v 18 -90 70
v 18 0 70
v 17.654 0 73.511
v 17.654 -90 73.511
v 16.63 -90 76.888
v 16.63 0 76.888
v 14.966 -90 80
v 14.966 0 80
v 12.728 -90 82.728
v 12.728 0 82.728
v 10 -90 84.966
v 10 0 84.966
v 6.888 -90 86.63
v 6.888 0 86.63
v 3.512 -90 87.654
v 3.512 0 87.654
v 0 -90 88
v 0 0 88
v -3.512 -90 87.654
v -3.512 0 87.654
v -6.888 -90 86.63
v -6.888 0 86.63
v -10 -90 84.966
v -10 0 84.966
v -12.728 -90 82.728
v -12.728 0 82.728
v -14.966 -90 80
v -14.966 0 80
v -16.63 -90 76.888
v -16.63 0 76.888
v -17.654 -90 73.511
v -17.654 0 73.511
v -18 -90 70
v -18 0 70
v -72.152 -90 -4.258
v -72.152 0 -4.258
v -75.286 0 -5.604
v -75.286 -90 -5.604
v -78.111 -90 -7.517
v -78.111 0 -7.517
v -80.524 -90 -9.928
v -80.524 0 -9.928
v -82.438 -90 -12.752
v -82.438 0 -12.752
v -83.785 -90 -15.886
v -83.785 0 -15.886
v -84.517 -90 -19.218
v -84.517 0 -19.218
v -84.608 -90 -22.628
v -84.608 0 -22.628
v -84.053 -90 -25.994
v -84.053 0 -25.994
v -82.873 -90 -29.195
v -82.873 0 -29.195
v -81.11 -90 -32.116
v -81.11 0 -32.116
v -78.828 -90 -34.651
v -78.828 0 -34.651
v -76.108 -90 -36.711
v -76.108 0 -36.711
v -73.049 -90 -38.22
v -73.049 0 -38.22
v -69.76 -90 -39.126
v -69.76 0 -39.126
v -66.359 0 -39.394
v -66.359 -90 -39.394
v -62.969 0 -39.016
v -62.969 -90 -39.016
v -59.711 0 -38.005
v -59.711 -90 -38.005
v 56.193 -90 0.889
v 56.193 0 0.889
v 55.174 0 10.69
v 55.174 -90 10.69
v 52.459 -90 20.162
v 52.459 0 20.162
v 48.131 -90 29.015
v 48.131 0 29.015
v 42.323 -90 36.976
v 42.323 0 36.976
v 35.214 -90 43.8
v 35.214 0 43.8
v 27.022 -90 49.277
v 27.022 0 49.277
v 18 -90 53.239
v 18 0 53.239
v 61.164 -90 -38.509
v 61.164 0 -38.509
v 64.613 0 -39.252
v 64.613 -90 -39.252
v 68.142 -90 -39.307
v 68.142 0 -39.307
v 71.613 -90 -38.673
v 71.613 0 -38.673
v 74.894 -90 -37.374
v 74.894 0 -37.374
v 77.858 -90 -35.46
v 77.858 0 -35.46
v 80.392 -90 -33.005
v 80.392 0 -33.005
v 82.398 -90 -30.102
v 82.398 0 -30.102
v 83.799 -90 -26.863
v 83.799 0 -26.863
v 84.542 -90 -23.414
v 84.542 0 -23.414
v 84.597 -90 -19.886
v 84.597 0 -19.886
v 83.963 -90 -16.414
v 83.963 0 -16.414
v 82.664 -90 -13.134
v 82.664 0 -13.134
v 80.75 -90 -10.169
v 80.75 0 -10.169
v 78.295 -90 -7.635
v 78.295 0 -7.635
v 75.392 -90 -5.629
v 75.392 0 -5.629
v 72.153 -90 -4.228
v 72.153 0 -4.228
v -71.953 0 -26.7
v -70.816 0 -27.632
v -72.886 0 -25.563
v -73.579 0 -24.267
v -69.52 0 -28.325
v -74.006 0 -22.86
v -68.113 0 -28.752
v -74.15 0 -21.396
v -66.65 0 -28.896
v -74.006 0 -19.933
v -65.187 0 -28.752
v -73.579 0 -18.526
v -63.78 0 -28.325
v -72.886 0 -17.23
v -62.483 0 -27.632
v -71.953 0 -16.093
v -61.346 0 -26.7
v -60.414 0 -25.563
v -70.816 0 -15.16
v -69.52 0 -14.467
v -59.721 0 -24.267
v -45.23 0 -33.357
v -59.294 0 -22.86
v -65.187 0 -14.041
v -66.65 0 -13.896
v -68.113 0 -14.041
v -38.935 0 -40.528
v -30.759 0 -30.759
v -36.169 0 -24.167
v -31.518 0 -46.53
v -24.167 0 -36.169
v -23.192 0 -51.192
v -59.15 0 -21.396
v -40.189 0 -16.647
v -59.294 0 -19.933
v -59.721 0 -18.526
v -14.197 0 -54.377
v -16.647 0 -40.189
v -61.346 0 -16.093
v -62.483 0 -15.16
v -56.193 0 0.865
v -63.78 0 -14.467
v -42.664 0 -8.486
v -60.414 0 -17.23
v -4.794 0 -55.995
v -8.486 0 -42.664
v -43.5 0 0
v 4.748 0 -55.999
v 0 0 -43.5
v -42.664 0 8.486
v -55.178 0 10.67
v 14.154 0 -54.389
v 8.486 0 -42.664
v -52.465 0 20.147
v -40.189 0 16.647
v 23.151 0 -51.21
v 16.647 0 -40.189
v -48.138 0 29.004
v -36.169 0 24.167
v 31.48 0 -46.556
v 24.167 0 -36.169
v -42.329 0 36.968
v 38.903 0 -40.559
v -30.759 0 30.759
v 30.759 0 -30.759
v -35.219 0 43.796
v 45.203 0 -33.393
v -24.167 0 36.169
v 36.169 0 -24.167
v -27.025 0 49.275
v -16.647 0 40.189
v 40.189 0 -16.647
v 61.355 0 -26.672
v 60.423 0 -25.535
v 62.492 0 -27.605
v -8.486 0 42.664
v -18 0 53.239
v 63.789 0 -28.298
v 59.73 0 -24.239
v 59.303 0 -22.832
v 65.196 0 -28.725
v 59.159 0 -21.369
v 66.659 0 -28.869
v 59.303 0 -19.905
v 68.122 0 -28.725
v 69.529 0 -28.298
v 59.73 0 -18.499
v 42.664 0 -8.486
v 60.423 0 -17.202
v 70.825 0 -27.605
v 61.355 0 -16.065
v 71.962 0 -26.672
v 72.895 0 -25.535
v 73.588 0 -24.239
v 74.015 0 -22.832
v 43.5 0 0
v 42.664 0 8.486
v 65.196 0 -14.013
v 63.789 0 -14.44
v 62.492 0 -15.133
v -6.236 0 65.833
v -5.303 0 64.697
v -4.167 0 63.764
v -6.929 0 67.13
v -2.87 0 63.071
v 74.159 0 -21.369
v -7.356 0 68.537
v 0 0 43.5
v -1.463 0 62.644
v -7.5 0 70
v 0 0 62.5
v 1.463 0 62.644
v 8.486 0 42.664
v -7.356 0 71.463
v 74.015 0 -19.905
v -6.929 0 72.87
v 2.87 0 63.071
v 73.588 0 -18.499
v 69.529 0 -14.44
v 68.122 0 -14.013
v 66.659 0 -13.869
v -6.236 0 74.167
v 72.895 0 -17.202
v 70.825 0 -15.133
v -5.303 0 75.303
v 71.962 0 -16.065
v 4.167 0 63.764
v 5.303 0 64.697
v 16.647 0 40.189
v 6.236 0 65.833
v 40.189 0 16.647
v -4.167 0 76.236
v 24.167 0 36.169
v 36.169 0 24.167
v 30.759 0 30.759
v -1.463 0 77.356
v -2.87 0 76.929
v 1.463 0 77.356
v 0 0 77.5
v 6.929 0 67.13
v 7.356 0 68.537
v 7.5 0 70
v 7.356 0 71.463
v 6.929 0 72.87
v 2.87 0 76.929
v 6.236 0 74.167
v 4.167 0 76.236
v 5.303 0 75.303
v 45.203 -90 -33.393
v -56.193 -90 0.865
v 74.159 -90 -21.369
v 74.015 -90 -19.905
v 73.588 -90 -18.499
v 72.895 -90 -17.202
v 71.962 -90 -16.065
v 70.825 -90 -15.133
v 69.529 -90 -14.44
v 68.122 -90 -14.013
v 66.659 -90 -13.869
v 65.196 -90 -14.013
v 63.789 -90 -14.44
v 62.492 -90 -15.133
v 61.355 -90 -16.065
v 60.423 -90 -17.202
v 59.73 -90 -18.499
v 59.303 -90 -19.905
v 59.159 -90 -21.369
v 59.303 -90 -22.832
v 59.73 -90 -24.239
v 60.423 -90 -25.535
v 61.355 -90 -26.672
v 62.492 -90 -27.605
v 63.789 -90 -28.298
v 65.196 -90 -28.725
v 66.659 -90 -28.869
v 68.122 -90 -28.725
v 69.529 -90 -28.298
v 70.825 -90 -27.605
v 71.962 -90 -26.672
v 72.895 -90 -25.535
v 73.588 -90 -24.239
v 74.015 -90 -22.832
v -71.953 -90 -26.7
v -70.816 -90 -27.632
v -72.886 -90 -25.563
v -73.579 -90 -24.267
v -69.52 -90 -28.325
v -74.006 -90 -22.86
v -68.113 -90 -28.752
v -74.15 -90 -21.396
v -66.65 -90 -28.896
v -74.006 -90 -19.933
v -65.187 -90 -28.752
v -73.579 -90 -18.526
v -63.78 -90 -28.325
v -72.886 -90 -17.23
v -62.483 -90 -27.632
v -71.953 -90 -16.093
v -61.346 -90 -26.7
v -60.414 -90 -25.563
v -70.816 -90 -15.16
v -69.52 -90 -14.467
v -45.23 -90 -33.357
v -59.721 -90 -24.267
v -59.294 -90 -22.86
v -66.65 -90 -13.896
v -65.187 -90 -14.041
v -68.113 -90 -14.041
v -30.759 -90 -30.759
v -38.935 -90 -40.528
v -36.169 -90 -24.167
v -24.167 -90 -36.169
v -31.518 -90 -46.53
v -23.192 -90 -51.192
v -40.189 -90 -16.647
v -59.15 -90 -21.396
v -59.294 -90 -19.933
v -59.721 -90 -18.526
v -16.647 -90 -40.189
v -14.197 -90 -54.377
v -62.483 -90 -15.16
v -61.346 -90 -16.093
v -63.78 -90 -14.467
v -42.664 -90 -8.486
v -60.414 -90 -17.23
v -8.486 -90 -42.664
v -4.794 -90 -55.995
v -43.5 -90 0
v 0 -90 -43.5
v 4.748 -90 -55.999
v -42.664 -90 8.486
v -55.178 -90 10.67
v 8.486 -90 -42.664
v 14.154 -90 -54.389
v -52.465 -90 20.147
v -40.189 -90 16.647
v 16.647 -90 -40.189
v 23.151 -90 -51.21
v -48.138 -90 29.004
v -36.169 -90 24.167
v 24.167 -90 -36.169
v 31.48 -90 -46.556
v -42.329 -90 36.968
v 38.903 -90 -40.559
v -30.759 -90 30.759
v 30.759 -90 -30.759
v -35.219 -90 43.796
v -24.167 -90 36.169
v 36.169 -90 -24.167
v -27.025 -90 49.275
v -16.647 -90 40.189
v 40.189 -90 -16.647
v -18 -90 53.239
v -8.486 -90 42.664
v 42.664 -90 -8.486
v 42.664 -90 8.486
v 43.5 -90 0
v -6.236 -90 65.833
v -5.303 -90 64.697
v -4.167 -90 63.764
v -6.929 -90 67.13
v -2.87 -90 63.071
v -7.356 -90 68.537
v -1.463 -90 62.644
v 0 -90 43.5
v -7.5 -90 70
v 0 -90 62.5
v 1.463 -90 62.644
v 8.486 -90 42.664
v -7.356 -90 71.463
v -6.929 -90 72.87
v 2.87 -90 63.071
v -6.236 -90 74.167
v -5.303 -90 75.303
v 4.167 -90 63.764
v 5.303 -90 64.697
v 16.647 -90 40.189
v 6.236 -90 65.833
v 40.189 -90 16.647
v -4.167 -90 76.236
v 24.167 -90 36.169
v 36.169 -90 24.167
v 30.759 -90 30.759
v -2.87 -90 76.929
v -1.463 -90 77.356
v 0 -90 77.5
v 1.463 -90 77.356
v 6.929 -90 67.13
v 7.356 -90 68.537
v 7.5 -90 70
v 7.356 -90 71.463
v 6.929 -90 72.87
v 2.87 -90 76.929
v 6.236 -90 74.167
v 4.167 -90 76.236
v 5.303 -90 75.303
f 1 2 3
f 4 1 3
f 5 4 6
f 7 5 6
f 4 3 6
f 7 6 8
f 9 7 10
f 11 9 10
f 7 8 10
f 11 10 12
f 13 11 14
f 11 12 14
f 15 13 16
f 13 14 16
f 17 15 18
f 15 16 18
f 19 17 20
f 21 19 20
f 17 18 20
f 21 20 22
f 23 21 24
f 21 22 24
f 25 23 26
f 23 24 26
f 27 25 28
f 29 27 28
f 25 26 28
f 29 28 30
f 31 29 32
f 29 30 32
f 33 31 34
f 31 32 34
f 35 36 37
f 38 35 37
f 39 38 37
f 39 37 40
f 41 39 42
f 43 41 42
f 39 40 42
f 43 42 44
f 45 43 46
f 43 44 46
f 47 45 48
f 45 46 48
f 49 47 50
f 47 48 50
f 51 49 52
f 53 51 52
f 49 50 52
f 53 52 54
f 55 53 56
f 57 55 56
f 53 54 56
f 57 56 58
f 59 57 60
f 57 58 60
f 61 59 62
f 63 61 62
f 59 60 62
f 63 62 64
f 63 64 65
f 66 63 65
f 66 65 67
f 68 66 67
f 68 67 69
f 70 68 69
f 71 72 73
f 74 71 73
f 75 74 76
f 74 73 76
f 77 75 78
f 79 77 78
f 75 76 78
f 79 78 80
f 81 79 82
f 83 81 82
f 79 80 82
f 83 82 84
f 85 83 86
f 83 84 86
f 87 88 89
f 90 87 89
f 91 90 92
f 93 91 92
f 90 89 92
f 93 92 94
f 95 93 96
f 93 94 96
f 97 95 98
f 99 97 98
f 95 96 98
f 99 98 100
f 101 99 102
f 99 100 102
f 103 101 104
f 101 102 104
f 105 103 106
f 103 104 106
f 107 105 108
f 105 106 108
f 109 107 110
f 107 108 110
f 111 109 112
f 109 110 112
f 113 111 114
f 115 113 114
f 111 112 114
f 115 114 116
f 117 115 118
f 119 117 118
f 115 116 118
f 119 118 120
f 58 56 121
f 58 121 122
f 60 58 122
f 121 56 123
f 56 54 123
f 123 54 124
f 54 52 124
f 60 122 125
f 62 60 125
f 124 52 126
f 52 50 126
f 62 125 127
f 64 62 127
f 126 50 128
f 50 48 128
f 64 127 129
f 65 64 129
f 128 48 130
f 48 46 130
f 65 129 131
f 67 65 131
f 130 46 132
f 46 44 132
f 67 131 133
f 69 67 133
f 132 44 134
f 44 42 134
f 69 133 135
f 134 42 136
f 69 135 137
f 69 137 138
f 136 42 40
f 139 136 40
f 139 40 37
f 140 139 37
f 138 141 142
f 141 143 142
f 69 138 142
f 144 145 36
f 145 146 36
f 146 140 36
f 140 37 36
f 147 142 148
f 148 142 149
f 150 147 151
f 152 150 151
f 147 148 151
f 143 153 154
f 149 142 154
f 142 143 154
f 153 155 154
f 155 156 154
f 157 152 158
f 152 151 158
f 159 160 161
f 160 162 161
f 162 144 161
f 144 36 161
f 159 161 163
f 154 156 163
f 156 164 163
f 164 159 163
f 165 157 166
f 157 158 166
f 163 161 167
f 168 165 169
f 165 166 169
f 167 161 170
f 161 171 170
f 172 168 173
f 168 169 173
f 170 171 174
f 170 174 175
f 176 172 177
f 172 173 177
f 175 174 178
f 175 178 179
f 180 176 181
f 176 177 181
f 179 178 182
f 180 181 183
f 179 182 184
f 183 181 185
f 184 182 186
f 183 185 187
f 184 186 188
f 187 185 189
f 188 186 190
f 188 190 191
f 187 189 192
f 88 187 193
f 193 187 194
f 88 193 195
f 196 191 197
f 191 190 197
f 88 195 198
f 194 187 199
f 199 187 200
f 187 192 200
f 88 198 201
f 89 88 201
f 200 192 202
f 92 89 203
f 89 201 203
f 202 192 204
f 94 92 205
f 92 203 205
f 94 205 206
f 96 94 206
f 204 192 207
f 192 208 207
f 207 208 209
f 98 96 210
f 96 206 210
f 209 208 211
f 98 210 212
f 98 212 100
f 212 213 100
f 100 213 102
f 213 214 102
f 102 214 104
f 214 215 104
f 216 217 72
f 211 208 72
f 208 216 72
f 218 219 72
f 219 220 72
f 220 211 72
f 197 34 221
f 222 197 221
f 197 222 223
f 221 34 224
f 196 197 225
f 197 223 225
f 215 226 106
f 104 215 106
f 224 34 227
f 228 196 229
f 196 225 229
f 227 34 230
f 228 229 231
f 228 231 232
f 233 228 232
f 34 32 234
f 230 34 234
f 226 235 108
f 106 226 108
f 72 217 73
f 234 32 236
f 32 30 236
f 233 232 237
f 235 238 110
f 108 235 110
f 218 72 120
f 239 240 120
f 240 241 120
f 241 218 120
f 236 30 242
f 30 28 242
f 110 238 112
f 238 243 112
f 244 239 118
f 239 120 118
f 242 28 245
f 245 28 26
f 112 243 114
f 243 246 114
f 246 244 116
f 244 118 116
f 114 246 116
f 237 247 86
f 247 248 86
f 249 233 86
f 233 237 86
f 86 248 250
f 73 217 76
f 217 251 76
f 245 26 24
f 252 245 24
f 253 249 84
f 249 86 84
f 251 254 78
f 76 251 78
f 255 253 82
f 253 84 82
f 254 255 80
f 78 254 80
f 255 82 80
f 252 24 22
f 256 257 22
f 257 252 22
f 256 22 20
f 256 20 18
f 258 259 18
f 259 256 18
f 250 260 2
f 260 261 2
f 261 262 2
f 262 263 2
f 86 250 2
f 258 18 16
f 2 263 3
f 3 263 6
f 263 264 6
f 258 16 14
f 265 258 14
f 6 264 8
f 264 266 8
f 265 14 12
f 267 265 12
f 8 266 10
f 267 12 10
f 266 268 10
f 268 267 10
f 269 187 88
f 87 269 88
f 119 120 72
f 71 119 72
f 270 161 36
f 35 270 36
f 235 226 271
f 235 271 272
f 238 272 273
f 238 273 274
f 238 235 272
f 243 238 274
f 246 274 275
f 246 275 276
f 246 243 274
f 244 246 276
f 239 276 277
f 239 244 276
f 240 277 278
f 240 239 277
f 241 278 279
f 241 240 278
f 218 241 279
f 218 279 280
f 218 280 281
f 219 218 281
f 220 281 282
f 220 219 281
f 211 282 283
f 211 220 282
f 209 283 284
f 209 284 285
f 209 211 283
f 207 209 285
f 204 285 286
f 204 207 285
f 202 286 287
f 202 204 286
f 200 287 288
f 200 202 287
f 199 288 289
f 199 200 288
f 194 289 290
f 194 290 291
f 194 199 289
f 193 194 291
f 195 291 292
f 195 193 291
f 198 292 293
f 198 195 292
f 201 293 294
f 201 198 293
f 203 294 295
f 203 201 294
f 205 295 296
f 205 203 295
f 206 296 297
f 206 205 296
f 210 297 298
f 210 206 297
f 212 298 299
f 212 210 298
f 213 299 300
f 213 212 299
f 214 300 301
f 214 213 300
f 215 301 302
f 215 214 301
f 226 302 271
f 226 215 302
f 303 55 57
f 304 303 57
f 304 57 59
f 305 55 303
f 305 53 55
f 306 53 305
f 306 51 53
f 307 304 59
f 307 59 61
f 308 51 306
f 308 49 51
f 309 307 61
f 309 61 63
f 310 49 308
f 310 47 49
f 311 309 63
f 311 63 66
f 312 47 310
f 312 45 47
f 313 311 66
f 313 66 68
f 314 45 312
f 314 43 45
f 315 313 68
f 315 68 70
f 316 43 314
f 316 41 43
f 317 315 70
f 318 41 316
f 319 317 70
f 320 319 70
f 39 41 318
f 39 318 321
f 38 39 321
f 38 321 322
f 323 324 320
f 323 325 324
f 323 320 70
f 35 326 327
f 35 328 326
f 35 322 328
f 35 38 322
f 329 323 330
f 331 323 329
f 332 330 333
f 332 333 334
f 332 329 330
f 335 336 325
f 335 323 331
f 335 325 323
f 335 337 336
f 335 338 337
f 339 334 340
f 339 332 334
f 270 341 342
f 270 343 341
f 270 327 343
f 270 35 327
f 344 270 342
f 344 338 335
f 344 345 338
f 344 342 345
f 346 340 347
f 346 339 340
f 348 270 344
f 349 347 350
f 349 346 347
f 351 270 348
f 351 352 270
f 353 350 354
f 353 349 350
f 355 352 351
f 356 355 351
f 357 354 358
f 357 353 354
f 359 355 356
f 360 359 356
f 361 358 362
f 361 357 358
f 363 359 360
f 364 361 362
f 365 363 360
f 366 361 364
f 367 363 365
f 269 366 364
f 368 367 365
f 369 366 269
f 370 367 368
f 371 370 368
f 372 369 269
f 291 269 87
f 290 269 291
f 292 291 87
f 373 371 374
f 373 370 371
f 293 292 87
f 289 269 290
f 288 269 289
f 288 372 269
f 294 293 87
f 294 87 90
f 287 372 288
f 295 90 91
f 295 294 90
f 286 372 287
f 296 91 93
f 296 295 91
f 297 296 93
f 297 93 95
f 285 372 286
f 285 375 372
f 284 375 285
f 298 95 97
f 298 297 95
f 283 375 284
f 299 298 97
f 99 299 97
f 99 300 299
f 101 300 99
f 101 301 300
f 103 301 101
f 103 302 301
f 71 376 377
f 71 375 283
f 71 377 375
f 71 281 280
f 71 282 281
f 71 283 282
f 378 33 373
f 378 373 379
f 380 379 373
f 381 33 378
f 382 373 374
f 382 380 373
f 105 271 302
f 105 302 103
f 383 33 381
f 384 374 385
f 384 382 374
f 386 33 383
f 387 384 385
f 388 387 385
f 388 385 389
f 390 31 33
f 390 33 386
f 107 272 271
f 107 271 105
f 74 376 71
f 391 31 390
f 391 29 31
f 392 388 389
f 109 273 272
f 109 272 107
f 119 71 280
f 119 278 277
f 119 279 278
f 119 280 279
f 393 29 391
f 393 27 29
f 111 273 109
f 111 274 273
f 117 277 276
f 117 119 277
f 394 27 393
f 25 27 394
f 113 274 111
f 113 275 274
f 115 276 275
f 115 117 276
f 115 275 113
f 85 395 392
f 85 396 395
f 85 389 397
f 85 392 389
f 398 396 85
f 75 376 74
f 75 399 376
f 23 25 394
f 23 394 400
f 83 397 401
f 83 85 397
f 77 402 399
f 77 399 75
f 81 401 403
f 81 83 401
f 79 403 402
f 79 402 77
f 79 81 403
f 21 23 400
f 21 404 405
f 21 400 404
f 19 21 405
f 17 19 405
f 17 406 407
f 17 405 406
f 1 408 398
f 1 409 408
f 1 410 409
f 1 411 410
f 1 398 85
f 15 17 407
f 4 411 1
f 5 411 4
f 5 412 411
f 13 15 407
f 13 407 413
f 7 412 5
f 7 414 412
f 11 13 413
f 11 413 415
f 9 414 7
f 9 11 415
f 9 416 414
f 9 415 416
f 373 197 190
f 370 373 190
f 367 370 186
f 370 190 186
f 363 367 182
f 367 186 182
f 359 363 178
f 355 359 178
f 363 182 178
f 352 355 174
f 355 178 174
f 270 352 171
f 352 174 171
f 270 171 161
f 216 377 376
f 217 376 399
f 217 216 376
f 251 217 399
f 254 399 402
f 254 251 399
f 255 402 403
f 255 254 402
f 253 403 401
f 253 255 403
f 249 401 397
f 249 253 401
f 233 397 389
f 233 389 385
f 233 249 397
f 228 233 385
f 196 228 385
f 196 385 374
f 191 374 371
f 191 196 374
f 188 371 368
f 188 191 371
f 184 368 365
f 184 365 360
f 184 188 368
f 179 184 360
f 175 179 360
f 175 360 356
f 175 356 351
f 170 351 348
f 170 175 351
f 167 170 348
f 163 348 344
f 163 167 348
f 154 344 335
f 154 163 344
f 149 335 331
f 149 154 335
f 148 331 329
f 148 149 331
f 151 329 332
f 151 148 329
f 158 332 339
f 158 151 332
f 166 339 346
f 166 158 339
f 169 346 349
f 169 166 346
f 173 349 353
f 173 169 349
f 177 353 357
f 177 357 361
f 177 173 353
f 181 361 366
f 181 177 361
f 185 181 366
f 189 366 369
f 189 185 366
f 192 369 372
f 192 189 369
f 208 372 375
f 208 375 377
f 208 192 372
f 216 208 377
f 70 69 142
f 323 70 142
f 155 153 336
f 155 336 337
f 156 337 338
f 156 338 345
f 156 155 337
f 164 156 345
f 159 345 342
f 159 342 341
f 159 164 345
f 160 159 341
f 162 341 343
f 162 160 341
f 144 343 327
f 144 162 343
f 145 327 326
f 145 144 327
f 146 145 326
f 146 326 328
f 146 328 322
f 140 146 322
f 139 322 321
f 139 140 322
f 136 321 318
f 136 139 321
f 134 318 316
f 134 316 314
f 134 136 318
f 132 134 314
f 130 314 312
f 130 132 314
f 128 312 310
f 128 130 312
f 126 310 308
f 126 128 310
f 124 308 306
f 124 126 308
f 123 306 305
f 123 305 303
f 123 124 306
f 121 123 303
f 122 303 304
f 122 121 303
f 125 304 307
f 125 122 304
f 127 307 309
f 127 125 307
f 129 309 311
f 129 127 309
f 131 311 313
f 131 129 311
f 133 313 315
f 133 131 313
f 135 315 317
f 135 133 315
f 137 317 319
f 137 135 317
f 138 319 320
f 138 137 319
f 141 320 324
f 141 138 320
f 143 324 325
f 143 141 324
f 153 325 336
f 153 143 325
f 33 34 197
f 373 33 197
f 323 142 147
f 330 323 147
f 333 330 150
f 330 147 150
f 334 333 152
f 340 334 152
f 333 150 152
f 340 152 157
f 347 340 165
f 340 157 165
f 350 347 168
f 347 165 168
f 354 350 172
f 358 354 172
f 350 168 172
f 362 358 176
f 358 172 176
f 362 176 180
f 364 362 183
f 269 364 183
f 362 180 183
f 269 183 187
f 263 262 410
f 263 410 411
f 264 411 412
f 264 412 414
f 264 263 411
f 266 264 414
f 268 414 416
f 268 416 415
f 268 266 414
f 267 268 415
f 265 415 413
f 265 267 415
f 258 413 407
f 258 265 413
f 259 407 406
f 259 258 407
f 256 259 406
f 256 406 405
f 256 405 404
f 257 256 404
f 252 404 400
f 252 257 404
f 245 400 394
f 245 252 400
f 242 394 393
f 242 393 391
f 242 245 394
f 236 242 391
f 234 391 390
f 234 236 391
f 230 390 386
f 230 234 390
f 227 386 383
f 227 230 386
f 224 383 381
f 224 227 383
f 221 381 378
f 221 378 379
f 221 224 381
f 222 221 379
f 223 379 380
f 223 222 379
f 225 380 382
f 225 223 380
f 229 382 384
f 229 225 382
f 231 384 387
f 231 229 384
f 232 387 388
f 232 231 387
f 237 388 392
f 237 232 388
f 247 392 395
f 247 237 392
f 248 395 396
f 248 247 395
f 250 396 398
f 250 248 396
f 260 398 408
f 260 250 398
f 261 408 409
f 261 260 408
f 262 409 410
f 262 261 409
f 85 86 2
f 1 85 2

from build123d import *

# Parameters (mm, degrees)
F0_R     = 7.5
F0_R_2   = 43.5
F1_DEPTH = 90


with BuildPart() as f1:
    # F0 (on Front) → F1 (new body)
    with BuildSketch(Plane.XZ):
        with BuildLine():
            Line((-59.710717, -38.00515), (-45.230323, -33.356527))
            ThreePointArc((-45.230323, -33.356527), (-0.022679, -56.199995), (45.203387, -33.39302))
            Line((45.203387, -33.39302), (61.163897, -38.509449))
            ThreePointArc((61.163897, -38.509449), (83.799497, -26.863437), (72.153485, -4.227837))
            Line((72.153485, -4.227837), (56.192975, 0.888592))
            ThreePointArc((56.192975, 0.888592), (45.401571, 33.123063), (18, 53.239459))
            Line((18, 53.239459), (18, 69.999847))
            ThreePointArc((18, 69.999847), (0, 87.999847), (-18, 69.999847))
            Line((-18, 69.999847), (-18, 53.239459))
            ThreePointArc((-18, 53.239459), (-45.408469, 33.113607), (-56.19334, 0.865185))
            Line((-56.19334, 0.865185), (-72.151649, -4.25789))
            ThreePointArc((-72.151649, -4.25789), (-83.538616, -27.622503), (-59.710717, -38.00515))
        make_face()
        with Locations((-66.649695, -21.3964)):
            Circle(F0_R, mode=Mode.SUBTRACT)
        Circle(F0_R_2, mode=Mode.SUBTRACT)
        with Locations((66.658691, -21.368643)):
            Circle(F0_R, mode=Mode.SUBTRACT)
        with Locations((0, 69.999847)):
            Circle(F0_R, mode=Mode.SUBTRACT)
    extrude(amount=F1_DEPTH)


solid = f1.part
